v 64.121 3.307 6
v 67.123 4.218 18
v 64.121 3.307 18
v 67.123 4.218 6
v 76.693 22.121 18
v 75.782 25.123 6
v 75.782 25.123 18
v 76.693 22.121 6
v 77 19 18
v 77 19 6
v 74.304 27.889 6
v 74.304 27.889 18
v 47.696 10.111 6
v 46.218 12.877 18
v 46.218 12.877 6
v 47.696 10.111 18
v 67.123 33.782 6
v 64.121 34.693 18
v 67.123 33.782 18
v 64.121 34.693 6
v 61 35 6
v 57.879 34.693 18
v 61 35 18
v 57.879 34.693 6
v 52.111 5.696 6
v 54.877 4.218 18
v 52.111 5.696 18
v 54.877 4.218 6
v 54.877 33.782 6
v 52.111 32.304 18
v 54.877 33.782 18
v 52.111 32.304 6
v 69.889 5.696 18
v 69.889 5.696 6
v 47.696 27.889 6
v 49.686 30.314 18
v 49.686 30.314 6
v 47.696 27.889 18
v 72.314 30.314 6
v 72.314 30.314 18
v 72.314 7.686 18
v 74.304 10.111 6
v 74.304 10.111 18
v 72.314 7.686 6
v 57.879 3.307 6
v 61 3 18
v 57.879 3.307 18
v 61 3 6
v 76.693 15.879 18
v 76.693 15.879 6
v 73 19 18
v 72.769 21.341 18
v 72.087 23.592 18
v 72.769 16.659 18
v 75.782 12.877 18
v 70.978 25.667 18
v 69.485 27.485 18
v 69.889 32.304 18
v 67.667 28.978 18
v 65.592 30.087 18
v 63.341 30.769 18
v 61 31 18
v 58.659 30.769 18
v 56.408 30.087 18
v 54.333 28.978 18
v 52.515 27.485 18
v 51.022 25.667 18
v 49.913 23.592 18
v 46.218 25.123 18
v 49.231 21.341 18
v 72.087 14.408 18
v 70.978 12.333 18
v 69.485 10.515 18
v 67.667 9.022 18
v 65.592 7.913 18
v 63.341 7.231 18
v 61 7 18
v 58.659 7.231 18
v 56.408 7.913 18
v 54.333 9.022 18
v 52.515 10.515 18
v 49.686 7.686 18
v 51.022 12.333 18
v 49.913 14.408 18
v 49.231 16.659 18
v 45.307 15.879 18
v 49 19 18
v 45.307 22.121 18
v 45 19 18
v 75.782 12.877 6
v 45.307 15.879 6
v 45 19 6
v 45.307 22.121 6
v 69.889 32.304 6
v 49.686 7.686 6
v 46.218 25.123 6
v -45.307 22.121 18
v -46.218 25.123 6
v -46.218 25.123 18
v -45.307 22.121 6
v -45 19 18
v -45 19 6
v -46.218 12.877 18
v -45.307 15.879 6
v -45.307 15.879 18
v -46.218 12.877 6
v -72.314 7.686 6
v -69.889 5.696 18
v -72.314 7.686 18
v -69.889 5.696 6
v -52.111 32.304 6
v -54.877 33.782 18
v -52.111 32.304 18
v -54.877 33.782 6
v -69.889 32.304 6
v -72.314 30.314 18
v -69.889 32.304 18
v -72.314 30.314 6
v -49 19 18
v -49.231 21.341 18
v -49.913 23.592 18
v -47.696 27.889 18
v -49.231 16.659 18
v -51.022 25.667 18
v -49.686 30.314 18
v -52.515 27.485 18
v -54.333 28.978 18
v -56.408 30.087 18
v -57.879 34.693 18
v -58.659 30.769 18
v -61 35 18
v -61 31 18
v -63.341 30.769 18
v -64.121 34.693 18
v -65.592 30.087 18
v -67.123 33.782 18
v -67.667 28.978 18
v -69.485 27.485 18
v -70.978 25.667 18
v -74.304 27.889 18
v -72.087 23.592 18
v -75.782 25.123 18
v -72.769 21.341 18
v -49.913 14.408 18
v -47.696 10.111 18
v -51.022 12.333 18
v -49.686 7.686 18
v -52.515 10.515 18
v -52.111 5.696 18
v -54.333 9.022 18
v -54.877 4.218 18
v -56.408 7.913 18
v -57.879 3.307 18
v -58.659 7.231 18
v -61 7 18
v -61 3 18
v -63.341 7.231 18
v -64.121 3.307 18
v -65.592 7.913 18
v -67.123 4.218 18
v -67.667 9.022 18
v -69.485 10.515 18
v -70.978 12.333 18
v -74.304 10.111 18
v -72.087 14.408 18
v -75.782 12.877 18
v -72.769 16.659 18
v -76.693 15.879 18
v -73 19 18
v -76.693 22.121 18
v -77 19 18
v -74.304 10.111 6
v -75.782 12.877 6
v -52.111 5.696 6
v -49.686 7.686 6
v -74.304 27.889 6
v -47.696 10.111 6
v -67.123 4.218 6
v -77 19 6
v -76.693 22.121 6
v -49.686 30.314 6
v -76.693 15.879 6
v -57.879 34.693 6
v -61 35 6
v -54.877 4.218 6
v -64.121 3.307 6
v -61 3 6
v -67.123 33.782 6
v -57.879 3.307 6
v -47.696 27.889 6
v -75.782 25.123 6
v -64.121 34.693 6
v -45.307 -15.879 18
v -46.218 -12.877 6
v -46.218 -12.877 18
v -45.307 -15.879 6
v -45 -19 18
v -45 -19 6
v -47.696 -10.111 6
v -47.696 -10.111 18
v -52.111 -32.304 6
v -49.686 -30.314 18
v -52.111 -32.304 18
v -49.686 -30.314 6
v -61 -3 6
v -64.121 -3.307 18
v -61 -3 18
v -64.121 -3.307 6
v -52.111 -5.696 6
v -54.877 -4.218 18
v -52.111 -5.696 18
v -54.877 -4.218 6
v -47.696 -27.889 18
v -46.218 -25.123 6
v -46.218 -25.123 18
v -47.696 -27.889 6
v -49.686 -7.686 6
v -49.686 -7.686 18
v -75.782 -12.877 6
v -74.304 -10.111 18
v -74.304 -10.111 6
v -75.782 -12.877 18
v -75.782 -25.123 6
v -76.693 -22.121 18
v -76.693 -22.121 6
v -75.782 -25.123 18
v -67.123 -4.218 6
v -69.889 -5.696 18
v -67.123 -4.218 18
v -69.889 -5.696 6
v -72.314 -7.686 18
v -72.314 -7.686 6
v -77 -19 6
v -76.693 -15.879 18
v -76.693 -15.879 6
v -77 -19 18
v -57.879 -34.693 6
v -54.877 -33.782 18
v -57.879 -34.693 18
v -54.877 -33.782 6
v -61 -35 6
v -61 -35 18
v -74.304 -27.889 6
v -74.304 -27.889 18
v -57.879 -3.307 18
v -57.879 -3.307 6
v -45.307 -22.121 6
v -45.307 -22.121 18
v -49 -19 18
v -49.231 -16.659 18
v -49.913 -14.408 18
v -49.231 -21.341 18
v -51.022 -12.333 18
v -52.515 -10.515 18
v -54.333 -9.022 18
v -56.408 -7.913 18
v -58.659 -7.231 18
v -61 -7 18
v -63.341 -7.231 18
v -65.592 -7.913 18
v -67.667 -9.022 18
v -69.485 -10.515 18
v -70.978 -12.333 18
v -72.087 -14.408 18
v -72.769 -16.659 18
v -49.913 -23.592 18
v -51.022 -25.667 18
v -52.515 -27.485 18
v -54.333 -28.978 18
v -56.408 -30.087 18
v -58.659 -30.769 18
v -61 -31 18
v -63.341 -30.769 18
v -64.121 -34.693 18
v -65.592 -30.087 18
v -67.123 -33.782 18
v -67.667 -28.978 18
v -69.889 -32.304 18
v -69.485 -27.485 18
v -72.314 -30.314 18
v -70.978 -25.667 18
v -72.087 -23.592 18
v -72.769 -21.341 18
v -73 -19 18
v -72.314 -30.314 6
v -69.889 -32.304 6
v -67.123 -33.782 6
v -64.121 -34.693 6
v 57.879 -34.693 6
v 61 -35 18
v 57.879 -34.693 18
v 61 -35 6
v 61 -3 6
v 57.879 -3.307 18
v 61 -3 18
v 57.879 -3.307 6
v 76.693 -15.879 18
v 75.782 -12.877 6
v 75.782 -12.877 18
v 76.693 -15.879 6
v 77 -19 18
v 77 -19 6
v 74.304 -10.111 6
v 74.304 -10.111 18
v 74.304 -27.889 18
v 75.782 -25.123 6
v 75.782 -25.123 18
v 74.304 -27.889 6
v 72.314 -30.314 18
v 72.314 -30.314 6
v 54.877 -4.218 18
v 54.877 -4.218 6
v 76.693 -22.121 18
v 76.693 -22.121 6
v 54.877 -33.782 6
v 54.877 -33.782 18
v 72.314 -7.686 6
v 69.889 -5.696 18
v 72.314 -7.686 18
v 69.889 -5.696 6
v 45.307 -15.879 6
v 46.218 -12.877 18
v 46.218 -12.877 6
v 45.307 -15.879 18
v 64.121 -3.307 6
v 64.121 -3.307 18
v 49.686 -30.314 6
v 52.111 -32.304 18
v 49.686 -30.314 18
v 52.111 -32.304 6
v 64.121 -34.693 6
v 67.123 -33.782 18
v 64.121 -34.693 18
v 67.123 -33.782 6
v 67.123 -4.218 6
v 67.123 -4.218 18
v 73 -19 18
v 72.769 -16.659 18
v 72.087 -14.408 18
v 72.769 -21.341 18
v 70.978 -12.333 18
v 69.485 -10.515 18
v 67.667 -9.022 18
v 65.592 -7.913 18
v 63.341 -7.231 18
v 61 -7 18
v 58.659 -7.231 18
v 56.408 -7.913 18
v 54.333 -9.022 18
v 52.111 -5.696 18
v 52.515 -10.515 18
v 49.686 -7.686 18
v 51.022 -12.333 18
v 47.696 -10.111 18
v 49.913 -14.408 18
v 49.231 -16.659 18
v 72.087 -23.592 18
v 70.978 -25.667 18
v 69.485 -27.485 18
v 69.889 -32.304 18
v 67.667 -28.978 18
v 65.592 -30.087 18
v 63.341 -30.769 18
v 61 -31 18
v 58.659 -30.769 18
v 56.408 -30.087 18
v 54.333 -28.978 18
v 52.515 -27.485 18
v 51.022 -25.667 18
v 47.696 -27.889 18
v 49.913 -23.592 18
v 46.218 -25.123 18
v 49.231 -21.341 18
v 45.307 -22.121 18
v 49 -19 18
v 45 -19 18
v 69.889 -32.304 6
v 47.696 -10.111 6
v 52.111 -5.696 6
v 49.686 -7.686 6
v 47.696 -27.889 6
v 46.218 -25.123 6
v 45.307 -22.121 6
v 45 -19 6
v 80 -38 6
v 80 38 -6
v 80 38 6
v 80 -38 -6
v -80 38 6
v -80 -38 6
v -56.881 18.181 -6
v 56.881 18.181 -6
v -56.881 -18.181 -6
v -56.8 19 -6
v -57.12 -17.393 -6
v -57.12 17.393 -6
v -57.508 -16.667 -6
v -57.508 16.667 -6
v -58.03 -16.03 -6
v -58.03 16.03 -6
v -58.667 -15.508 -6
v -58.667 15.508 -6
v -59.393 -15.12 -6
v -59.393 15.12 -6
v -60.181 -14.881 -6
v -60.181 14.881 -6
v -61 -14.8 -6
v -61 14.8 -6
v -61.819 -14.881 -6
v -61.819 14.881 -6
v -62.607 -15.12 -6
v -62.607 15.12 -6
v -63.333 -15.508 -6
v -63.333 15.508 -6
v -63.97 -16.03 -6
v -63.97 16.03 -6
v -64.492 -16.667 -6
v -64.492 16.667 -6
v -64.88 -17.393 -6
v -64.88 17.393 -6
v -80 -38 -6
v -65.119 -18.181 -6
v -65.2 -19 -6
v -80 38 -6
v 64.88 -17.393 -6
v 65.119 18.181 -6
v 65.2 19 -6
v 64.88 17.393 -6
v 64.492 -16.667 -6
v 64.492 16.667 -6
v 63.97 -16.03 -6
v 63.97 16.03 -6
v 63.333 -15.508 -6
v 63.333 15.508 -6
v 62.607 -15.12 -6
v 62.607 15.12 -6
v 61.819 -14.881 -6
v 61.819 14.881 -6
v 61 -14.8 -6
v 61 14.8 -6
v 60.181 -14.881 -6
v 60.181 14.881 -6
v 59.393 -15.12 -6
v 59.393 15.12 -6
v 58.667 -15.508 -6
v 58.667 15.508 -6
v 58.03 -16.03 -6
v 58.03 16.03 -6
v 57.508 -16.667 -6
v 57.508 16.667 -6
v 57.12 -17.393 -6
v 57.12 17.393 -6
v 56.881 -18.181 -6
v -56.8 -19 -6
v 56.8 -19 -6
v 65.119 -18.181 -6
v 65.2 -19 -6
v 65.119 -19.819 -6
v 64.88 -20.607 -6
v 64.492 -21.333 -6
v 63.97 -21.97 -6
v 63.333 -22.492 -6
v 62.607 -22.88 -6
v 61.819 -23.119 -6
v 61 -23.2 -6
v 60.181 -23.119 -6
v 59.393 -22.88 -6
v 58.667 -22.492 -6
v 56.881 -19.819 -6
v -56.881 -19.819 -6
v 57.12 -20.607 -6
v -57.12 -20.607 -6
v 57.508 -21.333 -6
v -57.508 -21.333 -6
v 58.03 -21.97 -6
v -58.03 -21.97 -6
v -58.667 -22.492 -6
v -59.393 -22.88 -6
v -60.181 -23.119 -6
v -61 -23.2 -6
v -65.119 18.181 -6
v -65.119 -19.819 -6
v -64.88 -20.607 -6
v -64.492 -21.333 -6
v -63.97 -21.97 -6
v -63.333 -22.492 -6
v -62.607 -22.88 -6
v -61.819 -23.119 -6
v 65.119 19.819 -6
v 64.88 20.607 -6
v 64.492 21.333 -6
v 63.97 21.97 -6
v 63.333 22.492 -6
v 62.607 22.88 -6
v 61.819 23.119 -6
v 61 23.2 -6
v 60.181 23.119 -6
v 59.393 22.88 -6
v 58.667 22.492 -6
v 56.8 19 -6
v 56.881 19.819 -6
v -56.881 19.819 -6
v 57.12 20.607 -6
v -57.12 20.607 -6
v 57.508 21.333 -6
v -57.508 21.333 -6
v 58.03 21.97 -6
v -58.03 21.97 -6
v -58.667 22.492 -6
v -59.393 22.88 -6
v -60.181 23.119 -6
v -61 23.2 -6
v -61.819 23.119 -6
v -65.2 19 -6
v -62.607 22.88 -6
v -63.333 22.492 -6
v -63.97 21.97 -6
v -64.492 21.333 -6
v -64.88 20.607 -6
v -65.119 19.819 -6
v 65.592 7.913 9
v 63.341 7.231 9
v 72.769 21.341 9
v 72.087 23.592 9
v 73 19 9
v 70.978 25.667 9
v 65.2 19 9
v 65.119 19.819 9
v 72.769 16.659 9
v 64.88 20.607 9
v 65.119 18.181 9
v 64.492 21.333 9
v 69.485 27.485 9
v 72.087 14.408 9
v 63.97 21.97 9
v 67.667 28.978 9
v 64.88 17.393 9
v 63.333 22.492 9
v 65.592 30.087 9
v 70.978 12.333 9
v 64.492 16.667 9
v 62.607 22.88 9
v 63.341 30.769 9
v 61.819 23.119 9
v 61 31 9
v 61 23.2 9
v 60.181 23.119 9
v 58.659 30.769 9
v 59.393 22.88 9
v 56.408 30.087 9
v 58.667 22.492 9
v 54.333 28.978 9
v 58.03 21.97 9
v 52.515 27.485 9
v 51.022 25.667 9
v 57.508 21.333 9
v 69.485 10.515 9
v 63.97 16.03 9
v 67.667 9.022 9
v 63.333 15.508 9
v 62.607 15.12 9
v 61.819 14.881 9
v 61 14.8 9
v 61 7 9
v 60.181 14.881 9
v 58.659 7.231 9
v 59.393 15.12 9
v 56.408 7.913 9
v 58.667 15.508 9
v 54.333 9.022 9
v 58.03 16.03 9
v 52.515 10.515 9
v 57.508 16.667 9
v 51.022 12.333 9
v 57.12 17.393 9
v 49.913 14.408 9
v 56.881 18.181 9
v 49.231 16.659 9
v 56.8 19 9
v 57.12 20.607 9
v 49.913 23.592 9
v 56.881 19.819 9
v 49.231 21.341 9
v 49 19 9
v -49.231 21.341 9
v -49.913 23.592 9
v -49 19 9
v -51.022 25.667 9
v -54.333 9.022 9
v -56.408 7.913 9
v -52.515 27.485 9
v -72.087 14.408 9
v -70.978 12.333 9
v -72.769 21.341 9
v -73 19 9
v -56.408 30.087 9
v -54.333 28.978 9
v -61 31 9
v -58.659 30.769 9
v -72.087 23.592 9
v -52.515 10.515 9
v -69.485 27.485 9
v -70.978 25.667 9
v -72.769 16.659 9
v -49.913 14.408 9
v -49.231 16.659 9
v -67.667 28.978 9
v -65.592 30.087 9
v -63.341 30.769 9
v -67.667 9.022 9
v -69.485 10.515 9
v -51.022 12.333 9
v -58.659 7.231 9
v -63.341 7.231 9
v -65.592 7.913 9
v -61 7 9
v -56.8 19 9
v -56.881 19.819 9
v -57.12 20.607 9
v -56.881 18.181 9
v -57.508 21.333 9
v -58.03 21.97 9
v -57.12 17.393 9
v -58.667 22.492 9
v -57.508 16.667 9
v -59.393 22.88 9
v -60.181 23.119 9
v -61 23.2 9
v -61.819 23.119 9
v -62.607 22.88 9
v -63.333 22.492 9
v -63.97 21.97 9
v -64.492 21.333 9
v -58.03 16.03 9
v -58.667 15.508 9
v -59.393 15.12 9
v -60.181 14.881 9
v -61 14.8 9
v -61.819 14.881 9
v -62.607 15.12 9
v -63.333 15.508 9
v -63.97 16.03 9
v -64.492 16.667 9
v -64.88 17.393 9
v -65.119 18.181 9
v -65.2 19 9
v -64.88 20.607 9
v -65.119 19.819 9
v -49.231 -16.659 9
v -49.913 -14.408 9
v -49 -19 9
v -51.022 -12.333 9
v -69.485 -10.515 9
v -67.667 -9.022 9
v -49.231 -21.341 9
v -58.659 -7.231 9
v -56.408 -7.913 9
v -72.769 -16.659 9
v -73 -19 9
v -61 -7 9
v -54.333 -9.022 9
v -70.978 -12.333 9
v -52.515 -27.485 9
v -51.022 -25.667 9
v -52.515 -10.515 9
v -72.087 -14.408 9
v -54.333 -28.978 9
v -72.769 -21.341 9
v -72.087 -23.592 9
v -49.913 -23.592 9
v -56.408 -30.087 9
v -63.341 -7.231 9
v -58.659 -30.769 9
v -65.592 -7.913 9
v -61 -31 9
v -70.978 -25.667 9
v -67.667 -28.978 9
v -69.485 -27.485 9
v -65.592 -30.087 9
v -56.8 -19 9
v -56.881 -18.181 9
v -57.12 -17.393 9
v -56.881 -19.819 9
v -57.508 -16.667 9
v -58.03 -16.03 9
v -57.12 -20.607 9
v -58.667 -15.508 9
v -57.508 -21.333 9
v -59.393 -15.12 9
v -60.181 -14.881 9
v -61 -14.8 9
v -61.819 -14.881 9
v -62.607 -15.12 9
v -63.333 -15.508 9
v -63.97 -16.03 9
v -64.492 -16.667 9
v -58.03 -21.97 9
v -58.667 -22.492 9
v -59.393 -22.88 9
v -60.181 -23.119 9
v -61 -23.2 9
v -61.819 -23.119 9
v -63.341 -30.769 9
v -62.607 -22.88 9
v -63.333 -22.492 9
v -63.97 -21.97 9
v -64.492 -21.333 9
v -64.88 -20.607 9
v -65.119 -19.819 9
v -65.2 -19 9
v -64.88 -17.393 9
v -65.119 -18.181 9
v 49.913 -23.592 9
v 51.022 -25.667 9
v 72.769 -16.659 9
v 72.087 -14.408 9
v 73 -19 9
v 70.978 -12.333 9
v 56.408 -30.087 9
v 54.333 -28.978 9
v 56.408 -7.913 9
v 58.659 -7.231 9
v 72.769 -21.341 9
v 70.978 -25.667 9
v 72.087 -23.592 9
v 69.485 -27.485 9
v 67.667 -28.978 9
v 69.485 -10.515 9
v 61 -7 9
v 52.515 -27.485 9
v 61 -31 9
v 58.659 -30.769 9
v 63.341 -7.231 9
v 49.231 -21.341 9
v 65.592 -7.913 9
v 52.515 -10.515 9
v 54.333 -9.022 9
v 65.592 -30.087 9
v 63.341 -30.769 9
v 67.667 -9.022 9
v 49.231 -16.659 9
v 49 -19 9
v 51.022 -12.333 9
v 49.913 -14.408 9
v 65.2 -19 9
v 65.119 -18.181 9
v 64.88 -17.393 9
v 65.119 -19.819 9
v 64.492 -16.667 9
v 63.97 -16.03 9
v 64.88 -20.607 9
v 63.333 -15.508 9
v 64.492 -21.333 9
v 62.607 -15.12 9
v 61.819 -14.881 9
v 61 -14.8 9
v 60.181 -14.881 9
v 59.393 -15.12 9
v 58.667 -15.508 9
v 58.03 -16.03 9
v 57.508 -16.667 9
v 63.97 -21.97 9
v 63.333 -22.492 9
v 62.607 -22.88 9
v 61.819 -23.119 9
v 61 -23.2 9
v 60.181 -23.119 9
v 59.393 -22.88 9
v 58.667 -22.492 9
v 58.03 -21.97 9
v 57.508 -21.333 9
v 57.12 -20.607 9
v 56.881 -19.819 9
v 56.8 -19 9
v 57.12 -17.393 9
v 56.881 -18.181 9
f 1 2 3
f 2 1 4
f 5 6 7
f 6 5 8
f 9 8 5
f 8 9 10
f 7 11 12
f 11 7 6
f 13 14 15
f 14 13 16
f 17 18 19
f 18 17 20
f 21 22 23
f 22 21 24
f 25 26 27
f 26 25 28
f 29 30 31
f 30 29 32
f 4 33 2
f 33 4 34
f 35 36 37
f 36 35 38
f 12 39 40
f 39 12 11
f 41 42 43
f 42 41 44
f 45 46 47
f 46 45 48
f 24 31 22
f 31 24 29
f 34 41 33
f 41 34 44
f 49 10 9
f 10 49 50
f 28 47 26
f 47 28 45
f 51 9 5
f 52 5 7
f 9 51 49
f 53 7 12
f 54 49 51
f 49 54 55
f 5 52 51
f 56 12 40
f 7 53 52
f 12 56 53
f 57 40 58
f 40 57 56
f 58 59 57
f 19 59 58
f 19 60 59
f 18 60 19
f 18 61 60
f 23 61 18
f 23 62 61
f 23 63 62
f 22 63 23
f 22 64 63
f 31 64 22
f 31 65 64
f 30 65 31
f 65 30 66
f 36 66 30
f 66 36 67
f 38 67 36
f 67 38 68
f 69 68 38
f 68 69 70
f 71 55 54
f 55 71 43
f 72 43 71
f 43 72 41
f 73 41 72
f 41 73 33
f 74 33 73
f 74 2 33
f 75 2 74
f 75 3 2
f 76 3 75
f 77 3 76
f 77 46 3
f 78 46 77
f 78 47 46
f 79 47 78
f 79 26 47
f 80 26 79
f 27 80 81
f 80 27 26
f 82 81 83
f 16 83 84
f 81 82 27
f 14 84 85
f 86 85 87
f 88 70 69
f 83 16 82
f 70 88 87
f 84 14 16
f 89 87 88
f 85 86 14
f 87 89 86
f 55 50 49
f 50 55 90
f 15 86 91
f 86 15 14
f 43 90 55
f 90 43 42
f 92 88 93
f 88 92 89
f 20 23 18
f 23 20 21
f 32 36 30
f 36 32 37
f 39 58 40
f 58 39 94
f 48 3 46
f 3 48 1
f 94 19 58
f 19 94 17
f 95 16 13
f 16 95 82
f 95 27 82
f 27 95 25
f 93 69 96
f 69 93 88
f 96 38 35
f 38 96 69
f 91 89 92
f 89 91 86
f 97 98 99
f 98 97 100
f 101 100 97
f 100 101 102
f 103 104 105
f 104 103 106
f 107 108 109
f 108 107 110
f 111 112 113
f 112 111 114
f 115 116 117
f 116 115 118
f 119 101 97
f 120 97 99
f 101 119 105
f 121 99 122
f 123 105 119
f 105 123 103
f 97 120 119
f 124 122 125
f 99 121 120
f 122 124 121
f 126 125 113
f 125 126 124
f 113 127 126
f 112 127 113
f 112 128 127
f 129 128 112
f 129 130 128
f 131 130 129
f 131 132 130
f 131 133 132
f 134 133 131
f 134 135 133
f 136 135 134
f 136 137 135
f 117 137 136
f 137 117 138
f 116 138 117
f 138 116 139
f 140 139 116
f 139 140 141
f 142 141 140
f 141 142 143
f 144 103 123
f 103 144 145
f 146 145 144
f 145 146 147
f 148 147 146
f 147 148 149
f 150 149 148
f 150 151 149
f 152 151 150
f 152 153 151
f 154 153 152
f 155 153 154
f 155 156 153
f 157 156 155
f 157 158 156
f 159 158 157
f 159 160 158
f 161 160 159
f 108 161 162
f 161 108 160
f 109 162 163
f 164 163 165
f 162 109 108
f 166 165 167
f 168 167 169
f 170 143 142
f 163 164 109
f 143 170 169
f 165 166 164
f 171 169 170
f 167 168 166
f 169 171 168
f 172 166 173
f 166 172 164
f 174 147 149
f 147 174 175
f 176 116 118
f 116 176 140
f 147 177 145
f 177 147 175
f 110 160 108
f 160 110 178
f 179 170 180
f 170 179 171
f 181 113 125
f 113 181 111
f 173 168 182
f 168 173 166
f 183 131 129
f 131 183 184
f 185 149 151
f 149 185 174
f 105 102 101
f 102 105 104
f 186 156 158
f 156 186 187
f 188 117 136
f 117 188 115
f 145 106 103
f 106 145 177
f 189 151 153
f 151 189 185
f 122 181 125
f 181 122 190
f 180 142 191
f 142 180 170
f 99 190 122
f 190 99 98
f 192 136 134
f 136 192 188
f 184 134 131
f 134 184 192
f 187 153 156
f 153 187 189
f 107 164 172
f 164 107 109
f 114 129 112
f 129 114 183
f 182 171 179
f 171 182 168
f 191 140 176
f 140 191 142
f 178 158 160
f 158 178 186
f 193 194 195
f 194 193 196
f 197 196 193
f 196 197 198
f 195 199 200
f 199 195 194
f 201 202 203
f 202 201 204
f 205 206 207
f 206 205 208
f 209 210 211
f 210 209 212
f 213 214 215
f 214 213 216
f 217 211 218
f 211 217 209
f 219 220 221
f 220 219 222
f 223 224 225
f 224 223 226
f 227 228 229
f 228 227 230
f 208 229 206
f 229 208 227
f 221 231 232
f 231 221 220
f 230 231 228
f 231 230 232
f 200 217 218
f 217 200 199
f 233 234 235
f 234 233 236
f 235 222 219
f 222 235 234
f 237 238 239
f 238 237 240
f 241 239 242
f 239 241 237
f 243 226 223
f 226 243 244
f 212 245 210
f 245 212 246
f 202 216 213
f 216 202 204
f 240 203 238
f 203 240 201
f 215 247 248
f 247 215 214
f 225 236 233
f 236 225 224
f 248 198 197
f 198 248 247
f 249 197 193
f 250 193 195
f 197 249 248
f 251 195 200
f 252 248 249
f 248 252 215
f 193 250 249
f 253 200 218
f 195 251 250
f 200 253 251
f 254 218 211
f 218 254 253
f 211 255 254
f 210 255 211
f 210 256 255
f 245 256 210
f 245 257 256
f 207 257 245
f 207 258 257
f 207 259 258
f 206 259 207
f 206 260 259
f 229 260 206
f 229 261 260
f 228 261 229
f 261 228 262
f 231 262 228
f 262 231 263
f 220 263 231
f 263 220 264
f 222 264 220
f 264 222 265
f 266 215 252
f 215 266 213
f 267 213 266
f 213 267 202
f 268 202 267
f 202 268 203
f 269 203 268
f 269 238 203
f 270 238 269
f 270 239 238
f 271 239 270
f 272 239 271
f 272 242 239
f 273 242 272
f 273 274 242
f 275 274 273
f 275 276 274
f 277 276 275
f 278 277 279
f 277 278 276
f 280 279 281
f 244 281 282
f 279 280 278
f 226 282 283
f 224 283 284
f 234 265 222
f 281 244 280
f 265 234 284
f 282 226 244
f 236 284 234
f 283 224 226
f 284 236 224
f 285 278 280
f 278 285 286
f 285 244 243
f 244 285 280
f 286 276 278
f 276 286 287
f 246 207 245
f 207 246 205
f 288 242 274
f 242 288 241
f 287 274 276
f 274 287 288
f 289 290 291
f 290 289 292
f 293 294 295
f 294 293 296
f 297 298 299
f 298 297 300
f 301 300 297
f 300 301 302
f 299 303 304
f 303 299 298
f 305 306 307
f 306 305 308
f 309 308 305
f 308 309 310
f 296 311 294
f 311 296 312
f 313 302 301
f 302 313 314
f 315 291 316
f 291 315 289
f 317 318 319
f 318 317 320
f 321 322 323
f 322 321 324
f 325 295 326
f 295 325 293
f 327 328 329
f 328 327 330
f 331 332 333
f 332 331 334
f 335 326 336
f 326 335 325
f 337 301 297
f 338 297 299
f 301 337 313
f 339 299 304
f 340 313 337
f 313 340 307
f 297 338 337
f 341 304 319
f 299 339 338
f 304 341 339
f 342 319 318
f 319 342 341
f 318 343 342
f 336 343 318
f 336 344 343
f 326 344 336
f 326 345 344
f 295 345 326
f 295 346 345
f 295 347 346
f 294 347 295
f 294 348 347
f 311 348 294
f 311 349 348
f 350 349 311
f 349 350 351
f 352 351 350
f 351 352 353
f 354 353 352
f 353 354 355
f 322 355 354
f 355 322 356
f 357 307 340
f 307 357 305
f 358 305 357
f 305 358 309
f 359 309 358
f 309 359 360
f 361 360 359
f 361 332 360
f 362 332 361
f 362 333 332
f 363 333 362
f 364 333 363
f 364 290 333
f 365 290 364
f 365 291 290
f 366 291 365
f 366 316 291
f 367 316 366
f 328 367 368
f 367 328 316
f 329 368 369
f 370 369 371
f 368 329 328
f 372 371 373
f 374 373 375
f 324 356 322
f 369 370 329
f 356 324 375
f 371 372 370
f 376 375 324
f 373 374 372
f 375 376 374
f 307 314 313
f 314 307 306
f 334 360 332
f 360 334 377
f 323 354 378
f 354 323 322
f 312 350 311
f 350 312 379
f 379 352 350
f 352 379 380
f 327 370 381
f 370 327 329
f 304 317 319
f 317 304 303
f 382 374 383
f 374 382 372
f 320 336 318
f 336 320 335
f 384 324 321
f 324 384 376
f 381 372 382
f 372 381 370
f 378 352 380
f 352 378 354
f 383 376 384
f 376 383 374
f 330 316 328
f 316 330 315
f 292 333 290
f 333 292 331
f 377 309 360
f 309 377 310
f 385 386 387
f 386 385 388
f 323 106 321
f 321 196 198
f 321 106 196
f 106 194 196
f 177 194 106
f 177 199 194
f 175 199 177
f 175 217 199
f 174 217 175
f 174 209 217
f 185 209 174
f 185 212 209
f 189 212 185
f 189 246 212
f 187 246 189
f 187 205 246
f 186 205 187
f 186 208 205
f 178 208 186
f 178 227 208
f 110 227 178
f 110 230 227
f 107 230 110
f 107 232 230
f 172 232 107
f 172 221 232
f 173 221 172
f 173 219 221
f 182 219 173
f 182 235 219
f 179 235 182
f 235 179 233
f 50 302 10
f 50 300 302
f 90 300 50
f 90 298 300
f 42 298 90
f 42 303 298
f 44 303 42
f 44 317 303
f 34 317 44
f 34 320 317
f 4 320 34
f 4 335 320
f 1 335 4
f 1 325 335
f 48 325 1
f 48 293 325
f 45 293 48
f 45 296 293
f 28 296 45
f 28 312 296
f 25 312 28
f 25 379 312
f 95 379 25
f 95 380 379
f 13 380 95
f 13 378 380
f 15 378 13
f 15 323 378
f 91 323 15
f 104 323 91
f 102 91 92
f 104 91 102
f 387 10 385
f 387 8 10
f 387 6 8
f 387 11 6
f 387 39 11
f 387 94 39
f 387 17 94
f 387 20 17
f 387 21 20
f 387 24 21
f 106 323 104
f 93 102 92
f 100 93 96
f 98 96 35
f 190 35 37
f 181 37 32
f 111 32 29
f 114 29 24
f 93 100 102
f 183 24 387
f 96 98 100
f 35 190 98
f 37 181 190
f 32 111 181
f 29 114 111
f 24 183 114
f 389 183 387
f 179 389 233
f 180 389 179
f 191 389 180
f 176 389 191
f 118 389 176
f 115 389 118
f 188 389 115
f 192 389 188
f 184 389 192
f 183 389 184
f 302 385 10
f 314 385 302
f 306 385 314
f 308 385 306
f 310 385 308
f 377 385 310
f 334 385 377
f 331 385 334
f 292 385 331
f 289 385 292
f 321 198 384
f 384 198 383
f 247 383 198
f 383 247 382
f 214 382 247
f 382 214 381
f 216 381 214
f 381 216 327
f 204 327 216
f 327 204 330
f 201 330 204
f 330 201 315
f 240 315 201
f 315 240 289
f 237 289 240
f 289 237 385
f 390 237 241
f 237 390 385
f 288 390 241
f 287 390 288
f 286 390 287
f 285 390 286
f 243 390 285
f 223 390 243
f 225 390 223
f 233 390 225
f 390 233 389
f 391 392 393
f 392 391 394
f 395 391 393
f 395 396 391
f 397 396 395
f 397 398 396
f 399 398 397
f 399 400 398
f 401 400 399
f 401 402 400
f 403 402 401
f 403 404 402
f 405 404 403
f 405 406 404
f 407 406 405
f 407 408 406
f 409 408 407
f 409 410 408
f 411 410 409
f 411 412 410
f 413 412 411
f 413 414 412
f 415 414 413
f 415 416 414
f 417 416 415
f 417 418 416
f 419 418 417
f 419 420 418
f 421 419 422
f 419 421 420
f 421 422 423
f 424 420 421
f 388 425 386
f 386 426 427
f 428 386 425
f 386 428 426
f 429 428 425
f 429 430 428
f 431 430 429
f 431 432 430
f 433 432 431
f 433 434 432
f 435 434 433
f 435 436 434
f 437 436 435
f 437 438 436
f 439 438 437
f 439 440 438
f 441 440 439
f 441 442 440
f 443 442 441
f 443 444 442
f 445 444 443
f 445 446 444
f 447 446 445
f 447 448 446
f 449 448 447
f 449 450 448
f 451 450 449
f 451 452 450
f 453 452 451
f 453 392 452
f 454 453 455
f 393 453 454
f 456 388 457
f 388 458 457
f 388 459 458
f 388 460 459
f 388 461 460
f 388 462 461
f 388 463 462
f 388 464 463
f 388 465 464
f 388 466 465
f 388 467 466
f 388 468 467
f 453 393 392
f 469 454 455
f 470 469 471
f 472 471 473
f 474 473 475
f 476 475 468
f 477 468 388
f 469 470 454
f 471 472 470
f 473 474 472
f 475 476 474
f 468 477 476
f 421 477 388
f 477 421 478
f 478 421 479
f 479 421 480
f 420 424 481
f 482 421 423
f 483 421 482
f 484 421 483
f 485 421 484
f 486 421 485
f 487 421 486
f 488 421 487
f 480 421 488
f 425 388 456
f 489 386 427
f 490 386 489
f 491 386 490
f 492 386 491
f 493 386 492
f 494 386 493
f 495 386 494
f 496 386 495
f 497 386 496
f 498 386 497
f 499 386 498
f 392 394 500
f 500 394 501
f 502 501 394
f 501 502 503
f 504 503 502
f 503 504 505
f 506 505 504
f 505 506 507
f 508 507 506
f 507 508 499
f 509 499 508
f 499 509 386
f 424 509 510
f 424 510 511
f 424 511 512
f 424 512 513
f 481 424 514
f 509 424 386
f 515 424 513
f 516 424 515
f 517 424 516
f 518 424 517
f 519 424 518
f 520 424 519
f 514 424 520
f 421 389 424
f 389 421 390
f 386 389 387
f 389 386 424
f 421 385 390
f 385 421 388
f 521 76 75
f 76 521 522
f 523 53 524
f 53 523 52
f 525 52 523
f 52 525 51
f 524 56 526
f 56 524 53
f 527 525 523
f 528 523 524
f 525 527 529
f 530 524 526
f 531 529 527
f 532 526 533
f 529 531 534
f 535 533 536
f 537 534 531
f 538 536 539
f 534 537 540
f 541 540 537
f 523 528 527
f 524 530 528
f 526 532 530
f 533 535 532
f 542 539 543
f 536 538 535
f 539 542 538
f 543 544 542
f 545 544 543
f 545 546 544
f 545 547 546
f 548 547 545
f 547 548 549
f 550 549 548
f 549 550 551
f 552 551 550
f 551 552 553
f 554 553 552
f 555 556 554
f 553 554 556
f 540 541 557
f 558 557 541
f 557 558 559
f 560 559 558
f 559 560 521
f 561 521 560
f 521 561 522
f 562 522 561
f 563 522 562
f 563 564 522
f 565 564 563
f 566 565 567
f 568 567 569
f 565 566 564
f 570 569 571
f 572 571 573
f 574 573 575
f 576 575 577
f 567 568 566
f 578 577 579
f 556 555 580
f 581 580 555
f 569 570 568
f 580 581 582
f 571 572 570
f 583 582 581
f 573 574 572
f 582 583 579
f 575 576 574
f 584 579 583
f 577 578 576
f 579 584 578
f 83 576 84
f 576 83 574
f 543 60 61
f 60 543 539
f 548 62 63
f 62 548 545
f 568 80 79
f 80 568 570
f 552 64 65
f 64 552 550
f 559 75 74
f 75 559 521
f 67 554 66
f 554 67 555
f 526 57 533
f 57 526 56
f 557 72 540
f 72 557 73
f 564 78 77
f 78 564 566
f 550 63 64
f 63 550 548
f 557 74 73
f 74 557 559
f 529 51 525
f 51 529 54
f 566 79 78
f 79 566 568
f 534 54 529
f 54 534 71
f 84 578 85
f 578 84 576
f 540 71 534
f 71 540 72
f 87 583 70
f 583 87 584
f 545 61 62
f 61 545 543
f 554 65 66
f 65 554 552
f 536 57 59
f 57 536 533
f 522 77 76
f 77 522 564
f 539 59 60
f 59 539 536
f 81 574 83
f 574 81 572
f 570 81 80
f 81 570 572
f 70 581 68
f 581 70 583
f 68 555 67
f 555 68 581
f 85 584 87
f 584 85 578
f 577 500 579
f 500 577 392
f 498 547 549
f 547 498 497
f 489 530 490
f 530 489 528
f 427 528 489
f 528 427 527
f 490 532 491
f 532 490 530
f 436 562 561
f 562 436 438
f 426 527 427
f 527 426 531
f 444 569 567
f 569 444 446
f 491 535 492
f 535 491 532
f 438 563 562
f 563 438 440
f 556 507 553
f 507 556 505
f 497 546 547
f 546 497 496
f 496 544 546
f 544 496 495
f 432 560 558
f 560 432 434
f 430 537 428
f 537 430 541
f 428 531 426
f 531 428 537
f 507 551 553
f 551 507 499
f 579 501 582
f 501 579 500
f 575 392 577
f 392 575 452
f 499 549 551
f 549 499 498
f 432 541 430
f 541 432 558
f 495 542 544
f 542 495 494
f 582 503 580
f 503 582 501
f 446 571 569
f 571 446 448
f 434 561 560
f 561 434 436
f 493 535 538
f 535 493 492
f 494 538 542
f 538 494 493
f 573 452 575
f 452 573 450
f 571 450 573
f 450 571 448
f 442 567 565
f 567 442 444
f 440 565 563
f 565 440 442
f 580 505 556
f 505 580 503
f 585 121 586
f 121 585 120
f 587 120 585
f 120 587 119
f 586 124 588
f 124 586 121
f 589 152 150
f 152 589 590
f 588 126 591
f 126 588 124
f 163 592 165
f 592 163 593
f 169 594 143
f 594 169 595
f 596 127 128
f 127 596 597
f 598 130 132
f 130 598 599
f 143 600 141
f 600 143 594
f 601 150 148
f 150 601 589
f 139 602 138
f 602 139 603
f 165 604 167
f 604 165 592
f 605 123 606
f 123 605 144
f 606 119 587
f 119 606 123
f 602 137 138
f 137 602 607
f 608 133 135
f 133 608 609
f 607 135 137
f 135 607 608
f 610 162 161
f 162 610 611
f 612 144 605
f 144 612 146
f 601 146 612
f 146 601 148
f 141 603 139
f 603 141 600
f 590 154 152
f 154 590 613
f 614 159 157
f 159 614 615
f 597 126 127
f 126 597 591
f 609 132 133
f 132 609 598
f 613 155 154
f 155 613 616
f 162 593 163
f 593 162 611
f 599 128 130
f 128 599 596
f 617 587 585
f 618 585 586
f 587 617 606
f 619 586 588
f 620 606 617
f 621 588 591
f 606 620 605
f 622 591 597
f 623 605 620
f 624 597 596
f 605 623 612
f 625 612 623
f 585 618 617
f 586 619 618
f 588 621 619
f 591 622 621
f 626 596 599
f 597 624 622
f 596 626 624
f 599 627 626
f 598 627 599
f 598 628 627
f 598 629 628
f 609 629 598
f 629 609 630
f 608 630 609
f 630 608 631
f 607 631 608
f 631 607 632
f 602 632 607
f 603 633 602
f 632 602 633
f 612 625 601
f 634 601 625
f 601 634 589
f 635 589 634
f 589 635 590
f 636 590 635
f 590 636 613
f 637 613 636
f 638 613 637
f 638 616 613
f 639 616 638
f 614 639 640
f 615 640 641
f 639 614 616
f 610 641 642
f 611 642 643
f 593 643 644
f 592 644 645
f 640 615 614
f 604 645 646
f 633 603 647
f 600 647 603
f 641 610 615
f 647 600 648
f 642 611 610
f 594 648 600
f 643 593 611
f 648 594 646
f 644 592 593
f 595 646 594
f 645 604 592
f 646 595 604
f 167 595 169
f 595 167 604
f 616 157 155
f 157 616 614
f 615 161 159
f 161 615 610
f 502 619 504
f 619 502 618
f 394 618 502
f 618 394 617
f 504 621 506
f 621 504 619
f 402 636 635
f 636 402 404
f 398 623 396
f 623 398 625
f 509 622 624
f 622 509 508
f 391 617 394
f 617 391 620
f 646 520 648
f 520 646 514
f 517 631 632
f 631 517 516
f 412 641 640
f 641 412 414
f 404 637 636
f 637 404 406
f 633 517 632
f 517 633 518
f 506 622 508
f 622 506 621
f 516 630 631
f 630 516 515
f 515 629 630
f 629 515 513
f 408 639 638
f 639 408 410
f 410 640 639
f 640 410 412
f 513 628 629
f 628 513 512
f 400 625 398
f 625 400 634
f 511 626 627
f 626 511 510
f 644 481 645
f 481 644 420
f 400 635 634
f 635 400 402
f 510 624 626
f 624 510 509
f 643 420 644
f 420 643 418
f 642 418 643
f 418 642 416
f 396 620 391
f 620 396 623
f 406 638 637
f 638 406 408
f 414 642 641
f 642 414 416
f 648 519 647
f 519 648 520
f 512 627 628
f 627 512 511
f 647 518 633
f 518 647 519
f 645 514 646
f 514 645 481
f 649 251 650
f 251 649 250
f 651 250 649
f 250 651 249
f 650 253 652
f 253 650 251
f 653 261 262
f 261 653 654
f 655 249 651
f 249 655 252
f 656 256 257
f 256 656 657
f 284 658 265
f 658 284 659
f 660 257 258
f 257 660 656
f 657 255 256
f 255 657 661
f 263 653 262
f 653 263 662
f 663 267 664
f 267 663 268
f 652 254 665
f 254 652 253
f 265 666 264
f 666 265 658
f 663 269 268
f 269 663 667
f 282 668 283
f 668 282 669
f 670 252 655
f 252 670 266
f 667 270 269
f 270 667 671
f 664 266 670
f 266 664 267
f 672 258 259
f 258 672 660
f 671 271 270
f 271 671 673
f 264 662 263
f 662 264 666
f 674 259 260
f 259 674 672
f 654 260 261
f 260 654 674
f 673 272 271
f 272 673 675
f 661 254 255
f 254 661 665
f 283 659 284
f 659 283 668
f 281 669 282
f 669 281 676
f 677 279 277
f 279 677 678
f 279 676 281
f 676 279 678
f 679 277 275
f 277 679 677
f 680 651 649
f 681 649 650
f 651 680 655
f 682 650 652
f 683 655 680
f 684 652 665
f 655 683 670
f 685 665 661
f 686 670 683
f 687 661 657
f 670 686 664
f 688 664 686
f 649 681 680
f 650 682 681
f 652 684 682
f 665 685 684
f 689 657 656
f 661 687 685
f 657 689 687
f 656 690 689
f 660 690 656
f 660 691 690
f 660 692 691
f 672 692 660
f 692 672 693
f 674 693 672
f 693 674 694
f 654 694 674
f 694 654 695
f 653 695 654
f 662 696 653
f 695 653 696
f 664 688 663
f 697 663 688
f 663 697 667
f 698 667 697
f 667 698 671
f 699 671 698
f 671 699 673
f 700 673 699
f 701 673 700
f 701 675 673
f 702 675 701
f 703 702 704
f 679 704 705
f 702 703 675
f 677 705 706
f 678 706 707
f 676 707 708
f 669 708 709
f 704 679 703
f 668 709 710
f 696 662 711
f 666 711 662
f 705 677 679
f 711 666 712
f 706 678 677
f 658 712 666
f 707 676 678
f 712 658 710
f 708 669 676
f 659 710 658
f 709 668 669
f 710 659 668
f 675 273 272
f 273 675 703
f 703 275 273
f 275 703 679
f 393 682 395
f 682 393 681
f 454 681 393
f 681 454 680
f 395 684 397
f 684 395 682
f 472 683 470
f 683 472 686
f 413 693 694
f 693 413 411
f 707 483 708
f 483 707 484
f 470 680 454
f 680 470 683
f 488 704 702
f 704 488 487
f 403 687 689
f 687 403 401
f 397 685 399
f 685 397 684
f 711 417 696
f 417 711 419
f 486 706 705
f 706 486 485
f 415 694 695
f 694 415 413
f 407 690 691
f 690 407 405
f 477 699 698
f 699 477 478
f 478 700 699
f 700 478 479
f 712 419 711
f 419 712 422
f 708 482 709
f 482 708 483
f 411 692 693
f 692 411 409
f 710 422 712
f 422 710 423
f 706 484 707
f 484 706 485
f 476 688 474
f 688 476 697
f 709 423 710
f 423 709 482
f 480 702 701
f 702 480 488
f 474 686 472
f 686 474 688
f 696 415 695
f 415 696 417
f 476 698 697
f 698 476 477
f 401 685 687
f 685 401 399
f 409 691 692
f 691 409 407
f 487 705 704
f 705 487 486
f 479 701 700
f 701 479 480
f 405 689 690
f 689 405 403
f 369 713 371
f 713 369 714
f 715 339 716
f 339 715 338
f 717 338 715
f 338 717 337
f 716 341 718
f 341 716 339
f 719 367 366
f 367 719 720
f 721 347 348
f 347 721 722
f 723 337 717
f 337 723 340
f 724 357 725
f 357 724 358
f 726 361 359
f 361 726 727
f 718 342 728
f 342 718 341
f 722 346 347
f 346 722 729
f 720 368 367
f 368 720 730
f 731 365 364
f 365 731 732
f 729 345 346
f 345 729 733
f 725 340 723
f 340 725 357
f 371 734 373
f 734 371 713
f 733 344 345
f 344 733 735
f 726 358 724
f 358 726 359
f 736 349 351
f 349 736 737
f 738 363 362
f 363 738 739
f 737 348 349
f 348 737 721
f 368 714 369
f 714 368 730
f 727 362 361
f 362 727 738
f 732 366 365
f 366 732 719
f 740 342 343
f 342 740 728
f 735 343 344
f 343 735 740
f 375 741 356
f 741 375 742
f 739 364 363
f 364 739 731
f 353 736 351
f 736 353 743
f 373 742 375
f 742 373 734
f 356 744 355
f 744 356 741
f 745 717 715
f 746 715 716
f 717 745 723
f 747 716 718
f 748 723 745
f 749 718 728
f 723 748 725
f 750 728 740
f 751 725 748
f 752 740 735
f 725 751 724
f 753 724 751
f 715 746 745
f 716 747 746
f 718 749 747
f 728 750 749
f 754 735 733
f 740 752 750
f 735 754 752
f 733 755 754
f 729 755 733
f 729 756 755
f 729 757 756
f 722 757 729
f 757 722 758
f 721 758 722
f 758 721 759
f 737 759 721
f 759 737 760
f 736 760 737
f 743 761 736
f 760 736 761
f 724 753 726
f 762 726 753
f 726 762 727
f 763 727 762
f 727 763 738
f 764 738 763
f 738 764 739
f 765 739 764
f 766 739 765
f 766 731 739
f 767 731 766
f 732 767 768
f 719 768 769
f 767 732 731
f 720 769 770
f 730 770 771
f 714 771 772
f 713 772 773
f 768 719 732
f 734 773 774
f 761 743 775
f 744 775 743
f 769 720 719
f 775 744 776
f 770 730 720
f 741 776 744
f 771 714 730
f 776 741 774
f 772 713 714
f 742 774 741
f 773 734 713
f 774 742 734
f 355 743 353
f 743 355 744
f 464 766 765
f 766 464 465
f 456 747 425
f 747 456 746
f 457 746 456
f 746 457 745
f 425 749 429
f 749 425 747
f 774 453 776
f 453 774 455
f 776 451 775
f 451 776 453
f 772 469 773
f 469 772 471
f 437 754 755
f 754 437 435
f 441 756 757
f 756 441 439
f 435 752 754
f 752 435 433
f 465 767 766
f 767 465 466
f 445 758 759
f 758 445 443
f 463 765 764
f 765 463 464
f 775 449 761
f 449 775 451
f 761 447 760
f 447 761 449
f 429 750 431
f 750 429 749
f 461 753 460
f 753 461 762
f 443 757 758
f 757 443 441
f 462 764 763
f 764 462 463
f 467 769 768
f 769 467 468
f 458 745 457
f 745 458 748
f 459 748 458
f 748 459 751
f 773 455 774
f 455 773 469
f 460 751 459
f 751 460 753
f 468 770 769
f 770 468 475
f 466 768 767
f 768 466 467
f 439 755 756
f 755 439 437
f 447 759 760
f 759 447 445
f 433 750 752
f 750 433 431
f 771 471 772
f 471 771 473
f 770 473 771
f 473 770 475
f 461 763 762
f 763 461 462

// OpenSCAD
$fn = 32;

// ----------------------------------------------------------------------
// Socket pad plate
// bosses with counterbored sockets for the screws
// ----------------------------------------------------------------------

// --- parameters (mm) ---
base_t = 12;            // base plate thickness
boss_h = 12;            // boss height above the base plate
boss_d = 32;            // boss diameter
socket_d = 24;          // socket diameter
socket_depth = 9;       // socket depth from the boss face
bolt_d = 8.4;           // screw clearance hole through the socket floor
plate = [160, 76, 12];  // overall size (x, y, z)
edge = 19;              // boss centre offset from the plate edge
pads = 4;               // boss count, one per corner

// --- derived feature positions (mm) ---
height = base_t + boss_h;        // = 24   overall height of the part
corner_x = plate[0] / 2 - edge;  // = 61   boss centre X
corner_y = plate[1] / 2 - edge;  // = 19   boss centre Y
feature_centers = [
  [corner_x, corner_y],
  [-corner_x, corner_y],
  [-corner_x, -corner_y],
  [corner_x, -corner_y]
];   // boss centres: sockets, holes and the pads themselves are placed from here

// base plate, bosses on feature_centers, socket + through hole in each
difference() {
  union() {
    cube(plate, center = true);
    for (centre = feature_centers)
      translate([centre[0], centre[1], plate[2] / 2 - 1])
        cylinder(d = boss_d, h = boss_h + 1);
  }
  for (centre = feature_centers) {
    translate([centre[0], centre[1], plate[2] / 2 + boss_h - socket_depth])
      cylinder(d = socket_d, h = socket_depth + 1);
    translate([centre[0], centre[1], -height])
      cylinder(d = bolt_d, h = 2 * height + 2);  // through the socket floor
  }
}
